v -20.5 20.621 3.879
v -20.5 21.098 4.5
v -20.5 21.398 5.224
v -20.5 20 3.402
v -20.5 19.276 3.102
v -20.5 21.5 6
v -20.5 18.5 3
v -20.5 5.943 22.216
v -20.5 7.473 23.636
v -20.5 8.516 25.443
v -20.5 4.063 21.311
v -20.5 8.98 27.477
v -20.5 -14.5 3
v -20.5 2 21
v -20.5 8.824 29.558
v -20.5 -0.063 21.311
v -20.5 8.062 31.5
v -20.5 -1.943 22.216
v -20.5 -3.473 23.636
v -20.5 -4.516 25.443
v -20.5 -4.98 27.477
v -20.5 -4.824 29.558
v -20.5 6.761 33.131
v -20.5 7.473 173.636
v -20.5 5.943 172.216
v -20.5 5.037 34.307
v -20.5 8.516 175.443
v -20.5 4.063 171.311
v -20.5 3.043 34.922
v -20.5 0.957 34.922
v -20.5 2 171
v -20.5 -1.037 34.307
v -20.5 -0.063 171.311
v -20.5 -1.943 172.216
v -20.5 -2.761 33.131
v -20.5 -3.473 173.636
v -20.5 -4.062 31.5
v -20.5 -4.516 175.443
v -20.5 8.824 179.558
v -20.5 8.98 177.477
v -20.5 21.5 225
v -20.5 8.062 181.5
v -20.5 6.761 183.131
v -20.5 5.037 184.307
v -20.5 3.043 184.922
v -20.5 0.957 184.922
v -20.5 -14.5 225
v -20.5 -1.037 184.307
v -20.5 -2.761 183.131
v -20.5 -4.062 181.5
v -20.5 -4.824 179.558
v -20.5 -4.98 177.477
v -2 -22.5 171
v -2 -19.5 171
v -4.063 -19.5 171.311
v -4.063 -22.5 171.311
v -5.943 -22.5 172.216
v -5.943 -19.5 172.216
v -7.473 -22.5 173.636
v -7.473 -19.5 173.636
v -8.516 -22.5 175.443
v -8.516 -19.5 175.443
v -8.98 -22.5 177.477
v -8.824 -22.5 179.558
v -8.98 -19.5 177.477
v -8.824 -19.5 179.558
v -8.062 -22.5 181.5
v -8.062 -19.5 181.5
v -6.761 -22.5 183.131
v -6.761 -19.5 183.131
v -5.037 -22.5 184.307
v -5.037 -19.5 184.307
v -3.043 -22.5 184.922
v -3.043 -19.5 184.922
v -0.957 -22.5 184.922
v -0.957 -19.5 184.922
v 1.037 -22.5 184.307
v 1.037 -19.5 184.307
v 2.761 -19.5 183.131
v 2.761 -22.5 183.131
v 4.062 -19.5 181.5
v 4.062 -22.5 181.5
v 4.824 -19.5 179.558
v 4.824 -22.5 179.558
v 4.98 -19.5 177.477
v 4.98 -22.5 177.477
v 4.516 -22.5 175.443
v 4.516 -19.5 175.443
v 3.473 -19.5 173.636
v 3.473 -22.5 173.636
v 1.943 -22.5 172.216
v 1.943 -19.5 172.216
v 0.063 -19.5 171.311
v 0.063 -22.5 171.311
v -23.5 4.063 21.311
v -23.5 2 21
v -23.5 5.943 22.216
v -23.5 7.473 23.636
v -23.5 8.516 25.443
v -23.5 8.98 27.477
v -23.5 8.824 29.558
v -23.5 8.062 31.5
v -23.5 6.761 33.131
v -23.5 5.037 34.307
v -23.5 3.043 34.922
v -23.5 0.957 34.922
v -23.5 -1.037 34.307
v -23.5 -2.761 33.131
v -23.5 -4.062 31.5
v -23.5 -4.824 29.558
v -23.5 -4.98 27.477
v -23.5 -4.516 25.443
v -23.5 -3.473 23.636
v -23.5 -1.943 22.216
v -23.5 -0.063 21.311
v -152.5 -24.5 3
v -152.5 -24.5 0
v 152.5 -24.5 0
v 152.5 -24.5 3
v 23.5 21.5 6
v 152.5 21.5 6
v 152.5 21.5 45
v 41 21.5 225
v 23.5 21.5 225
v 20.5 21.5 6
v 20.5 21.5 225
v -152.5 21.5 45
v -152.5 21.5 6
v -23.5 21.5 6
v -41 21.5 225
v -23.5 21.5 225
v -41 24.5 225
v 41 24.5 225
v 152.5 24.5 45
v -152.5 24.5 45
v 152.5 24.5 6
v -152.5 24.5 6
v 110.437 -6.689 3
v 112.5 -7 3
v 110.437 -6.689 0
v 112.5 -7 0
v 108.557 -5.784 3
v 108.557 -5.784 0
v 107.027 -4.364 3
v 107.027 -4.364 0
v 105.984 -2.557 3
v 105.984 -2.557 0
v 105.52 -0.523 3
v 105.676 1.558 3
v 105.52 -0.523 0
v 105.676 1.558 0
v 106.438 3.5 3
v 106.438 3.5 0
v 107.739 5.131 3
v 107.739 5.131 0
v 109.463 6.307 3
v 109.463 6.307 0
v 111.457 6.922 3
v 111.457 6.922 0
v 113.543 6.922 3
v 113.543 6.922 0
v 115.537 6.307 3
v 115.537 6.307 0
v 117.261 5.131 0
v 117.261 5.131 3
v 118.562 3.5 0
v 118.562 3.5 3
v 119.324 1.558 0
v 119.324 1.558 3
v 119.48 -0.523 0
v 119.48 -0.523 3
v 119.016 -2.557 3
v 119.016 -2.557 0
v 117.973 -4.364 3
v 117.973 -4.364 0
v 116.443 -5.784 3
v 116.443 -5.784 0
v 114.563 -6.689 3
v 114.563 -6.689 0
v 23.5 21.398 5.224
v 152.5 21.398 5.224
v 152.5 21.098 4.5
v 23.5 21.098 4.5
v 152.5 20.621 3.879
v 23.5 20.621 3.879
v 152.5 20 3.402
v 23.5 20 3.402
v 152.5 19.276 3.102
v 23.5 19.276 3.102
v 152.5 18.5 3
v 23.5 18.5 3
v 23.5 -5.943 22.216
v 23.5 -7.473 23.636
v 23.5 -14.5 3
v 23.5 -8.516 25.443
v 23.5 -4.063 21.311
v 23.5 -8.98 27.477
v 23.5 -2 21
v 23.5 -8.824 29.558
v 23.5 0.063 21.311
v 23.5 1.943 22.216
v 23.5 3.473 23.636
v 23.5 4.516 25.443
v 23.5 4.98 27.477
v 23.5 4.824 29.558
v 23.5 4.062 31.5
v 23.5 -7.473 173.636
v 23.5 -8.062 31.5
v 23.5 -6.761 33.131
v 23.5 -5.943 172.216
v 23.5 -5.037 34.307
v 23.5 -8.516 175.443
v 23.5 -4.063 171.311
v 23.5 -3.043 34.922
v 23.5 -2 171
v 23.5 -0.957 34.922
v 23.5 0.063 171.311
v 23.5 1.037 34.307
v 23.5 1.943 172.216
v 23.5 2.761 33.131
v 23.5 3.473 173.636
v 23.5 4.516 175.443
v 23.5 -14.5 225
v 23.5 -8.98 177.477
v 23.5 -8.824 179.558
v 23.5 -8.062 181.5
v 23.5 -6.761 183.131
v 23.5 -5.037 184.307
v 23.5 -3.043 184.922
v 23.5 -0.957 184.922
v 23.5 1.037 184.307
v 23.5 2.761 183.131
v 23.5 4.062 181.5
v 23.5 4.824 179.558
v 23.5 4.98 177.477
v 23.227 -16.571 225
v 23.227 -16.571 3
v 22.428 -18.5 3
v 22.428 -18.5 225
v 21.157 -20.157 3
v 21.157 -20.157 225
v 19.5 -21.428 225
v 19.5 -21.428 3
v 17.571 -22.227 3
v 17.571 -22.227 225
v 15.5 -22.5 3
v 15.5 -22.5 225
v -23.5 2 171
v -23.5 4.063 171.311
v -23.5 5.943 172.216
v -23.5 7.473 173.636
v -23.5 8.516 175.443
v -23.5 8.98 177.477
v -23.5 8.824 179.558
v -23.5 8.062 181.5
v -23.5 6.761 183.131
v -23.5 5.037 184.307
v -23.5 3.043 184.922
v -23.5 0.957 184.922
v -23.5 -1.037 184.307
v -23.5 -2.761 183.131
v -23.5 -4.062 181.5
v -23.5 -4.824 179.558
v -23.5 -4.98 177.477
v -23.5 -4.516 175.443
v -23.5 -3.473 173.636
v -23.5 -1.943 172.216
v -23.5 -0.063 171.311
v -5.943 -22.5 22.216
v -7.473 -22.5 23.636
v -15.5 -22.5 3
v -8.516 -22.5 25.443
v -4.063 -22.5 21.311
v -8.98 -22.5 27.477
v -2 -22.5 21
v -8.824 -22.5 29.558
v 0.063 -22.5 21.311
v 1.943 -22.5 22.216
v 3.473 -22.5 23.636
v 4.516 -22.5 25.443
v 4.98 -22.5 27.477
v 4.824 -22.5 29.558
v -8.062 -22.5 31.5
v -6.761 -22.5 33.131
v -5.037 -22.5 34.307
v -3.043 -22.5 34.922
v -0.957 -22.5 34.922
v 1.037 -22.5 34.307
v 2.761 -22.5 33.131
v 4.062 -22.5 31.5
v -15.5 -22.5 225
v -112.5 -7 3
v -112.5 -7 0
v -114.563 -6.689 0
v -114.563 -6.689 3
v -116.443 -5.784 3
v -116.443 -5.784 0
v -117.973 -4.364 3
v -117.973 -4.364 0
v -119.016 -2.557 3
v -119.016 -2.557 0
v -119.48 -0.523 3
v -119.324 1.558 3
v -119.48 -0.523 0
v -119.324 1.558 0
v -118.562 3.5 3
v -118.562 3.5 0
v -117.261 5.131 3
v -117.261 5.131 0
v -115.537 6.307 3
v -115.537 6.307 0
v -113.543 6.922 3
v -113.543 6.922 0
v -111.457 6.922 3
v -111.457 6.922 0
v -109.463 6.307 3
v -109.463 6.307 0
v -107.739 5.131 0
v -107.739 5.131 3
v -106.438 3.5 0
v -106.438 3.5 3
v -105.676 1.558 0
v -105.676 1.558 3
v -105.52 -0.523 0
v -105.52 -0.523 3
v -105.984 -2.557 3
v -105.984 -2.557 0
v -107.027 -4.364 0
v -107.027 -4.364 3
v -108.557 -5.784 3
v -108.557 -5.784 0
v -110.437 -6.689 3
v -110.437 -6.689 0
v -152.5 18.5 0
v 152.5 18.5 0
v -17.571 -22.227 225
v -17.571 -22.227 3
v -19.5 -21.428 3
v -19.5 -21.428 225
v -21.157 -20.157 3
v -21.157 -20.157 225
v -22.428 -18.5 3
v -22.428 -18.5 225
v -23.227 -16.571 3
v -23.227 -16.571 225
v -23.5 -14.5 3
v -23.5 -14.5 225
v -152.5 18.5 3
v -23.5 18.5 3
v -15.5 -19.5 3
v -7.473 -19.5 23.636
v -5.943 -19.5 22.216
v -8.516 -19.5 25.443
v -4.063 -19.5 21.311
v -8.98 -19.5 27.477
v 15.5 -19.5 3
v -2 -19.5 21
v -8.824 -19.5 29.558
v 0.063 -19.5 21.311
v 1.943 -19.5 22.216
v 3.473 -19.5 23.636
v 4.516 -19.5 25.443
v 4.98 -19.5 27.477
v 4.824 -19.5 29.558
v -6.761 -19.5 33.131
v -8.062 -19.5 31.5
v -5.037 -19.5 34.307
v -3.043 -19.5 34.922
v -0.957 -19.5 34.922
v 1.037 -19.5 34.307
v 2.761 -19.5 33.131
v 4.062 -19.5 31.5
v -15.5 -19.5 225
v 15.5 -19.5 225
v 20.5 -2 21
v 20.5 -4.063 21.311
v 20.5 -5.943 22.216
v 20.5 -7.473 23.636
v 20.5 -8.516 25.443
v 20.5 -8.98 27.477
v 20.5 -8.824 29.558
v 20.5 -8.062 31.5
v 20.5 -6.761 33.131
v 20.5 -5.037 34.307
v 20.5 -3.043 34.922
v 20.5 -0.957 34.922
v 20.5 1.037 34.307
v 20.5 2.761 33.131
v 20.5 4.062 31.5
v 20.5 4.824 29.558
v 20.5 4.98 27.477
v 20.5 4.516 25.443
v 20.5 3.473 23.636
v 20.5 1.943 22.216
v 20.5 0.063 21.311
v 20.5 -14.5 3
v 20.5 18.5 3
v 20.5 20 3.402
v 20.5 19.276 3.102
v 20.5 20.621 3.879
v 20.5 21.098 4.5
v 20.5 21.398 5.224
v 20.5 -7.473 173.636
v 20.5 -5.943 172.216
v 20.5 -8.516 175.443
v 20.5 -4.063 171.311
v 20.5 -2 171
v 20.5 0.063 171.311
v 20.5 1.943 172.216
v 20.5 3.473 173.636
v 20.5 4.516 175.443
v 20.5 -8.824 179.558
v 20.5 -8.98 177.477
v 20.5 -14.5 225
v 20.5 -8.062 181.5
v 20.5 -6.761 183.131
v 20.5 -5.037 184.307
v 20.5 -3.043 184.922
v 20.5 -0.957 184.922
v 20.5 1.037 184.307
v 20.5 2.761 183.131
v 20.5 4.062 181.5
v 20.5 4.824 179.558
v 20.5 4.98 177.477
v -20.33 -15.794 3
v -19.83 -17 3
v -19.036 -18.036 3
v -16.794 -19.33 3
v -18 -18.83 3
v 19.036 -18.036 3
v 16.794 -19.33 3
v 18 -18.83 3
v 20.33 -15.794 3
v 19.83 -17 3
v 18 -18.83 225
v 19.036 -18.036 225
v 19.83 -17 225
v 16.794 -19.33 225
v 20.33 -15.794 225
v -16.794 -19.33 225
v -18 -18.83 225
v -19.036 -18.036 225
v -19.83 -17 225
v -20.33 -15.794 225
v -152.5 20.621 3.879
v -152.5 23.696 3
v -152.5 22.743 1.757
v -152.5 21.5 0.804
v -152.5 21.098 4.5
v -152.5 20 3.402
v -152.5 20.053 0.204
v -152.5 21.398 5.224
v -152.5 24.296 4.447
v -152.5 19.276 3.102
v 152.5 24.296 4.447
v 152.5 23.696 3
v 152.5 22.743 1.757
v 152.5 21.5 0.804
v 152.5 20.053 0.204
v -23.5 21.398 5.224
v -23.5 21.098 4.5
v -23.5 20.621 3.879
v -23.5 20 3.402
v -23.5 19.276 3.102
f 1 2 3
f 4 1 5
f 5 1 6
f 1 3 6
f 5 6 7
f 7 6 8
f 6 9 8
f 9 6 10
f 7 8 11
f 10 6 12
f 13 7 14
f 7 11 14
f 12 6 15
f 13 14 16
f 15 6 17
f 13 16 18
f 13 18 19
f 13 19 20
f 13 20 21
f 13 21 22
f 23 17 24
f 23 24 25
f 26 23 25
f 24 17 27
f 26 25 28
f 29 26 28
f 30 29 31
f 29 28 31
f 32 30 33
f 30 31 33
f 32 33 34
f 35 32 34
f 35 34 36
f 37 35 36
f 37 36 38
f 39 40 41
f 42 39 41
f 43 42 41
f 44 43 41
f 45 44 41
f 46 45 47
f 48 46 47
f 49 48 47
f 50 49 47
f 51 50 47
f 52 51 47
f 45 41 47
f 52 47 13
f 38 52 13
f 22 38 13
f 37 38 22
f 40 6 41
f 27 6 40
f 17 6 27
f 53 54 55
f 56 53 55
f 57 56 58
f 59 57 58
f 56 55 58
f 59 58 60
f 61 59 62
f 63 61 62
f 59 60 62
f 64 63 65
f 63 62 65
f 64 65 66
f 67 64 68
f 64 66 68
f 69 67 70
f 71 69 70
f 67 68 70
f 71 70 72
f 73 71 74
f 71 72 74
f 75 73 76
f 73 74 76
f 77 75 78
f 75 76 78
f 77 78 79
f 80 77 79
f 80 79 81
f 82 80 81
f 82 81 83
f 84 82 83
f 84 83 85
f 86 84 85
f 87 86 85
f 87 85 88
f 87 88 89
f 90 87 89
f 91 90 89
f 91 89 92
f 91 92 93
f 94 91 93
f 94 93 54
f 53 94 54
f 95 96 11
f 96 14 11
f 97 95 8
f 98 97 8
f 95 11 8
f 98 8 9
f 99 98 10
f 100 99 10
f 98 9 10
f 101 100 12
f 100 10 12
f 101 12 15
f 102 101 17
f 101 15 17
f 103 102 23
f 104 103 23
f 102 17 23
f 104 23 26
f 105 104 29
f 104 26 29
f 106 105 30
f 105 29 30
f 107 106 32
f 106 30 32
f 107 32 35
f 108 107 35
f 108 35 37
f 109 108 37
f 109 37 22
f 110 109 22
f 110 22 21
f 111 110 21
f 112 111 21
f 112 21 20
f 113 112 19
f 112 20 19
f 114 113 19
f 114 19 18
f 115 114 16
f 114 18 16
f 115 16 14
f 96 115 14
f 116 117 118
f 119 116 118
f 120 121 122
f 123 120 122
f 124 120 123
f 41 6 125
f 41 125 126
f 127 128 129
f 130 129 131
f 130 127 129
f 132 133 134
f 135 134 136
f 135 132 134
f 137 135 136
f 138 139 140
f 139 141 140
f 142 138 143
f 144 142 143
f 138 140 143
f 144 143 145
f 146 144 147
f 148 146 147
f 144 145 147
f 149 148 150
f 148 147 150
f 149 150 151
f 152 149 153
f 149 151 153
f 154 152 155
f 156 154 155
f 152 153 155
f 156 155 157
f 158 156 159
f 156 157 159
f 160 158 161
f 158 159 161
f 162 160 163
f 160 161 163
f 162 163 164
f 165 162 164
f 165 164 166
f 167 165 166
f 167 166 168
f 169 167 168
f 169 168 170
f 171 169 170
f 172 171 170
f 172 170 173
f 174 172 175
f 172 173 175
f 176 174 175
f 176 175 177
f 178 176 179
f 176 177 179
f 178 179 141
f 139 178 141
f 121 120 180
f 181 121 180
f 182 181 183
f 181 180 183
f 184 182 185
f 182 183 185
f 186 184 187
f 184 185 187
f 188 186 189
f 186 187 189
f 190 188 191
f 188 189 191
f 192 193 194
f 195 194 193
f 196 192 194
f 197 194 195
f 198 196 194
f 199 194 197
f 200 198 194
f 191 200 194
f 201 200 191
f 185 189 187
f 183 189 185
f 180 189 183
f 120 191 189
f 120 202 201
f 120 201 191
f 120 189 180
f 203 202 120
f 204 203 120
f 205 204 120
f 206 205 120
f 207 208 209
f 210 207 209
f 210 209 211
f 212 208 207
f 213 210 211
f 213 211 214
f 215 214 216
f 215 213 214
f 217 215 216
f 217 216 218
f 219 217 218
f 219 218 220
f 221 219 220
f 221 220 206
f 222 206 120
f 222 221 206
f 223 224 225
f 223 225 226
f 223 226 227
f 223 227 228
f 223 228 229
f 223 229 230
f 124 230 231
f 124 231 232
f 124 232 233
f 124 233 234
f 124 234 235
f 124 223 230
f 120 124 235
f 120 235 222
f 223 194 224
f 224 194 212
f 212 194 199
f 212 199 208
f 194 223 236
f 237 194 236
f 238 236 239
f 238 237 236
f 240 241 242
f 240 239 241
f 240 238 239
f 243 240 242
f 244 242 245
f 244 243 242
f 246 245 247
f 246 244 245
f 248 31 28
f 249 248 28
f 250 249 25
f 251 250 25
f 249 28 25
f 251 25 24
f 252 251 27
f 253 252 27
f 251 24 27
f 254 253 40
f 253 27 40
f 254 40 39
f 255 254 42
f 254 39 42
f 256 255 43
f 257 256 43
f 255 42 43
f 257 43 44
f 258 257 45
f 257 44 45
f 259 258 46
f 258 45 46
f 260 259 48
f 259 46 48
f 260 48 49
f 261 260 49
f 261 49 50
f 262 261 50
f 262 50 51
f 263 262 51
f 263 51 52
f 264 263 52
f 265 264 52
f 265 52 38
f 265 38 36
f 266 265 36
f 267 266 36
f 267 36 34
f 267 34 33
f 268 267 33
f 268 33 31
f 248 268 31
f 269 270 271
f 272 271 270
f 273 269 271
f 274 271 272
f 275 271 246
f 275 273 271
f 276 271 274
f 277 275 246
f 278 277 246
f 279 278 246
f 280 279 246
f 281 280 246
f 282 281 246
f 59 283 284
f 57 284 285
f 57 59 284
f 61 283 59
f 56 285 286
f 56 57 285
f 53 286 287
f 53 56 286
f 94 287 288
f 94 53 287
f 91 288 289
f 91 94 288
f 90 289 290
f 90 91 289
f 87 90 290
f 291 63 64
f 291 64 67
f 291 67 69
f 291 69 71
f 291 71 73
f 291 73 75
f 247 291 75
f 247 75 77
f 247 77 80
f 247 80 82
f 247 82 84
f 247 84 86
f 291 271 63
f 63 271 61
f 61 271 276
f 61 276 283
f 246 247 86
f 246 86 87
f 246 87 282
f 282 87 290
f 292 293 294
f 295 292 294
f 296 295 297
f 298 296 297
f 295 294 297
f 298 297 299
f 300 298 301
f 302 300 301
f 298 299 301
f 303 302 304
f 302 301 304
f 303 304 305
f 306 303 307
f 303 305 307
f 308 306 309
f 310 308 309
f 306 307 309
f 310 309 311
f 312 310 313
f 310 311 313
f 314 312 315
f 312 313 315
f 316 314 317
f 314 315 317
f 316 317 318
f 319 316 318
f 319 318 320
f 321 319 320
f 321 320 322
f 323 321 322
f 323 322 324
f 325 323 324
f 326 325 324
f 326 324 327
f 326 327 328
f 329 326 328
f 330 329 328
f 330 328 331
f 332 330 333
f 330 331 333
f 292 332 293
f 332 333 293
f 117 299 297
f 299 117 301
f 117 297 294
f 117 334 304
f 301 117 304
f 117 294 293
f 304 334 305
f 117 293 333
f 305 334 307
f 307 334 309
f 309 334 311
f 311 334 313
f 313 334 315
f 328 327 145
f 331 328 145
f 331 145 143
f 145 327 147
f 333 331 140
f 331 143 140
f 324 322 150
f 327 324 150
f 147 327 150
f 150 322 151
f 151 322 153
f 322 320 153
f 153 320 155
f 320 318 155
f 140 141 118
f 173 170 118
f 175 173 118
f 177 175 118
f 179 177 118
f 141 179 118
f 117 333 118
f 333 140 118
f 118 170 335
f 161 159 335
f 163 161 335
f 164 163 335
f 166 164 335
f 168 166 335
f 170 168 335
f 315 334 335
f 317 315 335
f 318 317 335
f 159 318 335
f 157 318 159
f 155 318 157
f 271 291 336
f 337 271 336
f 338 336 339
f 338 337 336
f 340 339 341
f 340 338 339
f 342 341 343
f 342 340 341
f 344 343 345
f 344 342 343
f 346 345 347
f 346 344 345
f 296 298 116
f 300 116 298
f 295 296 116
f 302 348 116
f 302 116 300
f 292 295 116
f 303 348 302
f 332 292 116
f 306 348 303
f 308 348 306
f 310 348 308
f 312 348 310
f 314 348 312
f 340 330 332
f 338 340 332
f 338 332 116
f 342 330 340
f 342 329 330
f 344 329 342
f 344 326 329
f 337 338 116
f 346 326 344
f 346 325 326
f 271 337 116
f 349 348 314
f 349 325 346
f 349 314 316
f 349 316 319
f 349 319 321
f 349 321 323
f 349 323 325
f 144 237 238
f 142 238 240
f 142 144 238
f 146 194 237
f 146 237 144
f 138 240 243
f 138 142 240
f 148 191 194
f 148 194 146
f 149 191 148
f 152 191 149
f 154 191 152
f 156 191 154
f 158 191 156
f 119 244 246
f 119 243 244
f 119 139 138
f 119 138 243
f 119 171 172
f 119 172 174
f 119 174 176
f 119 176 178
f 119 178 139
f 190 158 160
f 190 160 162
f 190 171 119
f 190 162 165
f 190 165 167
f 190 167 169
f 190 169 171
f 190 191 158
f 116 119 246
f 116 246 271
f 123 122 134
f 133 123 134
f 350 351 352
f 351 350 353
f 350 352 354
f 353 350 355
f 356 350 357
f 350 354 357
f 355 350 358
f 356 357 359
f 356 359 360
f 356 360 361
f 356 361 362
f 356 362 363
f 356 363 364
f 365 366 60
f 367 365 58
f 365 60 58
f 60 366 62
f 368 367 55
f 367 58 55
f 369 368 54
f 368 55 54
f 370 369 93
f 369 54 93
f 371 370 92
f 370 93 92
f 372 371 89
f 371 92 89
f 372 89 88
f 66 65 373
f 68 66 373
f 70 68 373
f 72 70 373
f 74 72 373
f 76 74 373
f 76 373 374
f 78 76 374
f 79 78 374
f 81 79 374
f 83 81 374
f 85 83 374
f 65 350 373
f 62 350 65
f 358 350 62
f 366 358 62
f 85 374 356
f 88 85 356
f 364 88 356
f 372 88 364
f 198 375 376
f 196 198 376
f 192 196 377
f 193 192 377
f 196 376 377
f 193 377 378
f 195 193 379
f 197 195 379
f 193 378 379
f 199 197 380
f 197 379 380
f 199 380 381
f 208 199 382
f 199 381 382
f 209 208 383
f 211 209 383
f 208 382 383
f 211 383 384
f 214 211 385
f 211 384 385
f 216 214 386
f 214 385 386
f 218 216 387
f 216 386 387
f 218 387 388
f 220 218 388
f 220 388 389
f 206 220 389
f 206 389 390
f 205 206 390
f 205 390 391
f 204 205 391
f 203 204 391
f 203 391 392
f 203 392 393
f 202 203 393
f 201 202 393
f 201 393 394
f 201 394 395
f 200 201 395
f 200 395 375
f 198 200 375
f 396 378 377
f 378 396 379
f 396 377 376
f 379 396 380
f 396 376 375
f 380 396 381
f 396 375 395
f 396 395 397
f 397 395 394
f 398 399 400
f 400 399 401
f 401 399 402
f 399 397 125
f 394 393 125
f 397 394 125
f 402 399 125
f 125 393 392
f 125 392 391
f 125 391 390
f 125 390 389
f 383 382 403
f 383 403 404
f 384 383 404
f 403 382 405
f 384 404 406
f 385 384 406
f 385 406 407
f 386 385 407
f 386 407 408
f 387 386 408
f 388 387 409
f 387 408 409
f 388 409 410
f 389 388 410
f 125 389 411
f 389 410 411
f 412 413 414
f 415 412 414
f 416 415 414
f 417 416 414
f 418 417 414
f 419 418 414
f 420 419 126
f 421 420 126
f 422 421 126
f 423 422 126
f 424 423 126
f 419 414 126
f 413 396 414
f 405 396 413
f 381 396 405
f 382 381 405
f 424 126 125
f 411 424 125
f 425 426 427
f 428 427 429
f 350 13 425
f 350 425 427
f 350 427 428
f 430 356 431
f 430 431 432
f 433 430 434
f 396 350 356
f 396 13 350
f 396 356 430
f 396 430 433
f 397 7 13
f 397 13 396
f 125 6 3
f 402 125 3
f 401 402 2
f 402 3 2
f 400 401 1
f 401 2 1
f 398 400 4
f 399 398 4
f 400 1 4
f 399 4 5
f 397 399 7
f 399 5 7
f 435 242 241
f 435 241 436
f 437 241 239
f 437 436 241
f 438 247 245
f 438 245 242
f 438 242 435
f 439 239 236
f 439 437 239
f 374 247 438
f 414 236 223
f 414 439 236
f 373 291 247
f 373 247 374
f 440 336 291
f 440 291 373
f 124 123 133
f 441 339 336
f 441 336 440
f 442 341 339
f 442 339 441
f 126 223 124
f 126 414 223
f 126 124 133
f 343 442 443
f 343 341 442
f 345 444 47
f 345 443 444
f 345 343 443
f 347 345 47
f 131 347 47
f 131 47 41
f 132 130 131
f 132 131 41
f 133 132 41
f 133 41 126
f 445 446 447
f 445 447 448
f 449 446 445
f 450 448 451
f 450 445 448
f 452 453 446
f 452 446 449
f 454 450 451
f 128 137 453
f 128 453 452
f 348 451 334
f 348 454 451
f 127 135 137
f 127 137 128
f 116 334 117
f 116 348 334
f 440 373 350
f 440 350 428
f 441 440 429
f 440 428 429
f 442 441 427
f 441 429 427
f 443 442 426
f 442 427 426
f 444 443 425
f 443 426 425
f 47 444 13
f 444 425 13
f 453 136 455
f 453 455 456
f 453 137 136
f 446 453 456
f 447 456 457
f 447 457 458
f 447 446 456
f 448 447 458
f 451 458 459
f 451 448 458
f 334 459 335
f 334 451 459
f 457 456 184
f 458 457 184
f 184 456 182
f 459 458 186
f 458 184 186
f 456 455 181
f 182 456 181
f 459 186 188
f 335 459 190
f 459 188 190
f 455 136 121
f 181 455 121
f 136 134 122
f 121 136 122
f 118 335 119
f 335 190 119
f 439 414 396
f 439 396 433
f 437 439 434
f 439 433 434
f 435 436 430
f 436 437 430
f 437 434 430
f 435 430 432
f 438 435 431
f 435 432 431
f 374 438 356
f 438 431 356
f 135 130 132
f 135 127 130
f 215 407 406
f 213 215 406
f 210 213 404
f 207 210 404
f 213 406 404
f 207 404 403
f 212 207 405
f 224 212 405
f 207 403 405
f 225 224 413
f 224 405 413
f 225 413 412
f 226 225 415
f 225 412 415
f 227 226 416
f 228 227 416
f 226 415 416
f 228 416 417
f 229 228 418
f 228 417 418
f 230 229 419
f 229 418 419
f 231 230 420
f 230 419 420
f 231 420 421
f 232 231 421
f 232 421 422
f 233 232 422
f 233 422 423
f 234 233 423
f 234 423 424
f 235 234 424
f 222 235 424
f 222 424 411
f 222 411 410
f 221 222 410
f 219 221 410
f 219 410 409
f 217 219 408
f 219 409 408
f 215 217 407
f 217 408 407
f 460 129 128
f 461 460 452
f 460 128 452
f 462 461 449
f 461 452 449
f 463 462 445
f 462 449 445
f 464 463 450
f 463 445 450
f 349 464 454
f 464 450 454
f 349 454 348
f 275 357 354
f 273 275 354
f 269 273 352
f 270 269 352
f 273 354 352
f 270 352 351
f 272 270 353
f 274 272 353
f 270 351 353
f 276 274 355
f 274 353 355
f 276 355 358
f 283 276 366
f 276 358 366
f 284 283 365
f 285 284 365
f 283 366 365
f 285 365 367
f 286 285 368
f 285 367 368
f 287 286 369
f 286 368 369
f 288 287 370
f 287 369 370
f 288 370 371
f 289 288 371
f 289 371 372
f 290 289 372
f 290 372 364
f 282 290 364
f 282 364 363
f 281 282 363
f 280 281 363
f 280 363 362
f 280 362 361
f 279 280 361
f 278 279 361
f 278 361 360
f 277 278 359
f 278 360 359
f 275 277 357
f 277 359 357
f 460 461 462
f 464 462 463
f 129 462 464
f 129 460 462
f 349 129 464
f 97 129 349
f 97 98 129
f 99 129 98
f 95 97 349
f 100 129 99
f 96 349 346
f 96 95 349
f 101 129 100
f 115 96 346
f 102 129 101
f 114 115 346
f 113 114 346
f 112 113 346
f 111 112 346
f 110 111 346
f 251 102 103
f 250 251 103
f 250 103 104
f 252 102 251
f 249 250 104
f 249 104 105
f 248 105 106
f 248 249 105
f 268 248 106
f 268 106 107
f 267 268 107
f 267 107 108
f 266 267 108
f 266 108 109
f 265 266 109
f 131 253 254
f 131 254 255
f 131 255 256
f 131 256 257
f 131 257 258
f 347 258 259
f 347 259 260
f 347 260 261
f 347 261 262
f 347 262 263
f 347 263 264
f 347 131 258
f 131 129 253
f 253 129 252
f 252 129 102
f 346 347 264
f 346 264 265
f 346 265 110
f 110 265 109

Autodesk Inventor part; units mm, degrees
ref_plane "YZ Plane" through (0, 0, 0) normal (1, 0, 0) x (0, 1, 0)
ref_plane "XZ Plane" through (0, 0, 0) normal (0, 1, 0) x (-1, 0, 0)
ref_plane "XY Plane" through (0, 0, 0) normal (0, 0, 1) x (1, 0, 0)
sketch "Sketch1" plane through (0, 0, 0) normal (0, 0, 1) x (1, 0, 0)
  line L0 (-152.5, -24.5) -> (152.5, -24.5)
  line L1 (152.5, -24.5) -> (152.5, 24.5)
  line L2 (152.5, 24.5) -> (-152.5, 24.5)
  line L3 (-152.5, 24.5) -> (-152.5, -24.5)
  point P0 (0, 24.5)
  point P1 (0, 0)
  point P2 (-152.5, 0)
  point P3 (0, -24.5)
  dimension "d0" = 305
  dimension "d1" = 49
extrude "Plate1" add sketch "Sketch1" along normal blind 3
sketch "Sketch2" plane through (152.5, 21.5, 0) normal (0, 1, 0) x (-1, 0, 0)
  line L0 (305, 0) -> (0, 0)
  line L1 (0, 0) -> (0, -225)
  line L2 (0, -225) -> (305, -225)
  line L3 (305, -225) -> (305, 0)
edge flange "Flange1" height 225 angle 90 thickness 3 bend radius 3 thickness toward (0, 1, 0) relief tear relief width 3 relief depth 1.5 edges at (0, 24.5, 0) wall of the first edge with corners at (-152.5, 21.5, 0) (152.5, 21.5, 0) (152.5, 21.5, 225) (-152.5, 21.5, 225)
bend "Bend1"
corner "Corner1"
chamfer "Corner Chamfer1" distance 111.5 distance2 180 1 edges at (152.5, 23, 225) measured on face at (-50.8333, 22.5, 225)
chamfer "Corner Chamfer2" distance 111.5 distance2 180 1 edges at (-152.5, 23, 225) measured on face at (-88, 22.5, 225)
sketch "Sketch4" plane through (0, 0, 3) normal (0, 0, 1) x (1, 0, 0)
  line L0 (152.5, -24.5) -> (-152.5, -24.5) projected
  line L1 (-112.5, 0) -> (112.5, 0)
  point P0 (0, 0)
  point P1 (0, 0)
  point P2 (0, -24.5)
  dimension "d26" = 225
  dimension "d27" = 24.5
hole "Hole1" at (-112.5, 0, 3) direction (0, 0, -1) diameter 14 end through all
pattern_linear "Rectangular Pattern1" count 2 spacing 225 along (1, 0, 0) of "Hole1"
sketch "Sketch3" plane through (-41, 21.5, 225) normal (0, 0, 1) x (1, 0, 0)
  line L0 (0, 0) -> (82, 0) projected
  line L1 (20.5, -41) -> (61.5, -41)
  line L2 (61.5, -41) -> (61.5, 0)
  line L3 (61.5, 0) -> (20.5, 0)
  line L4 (20.5, 0) -> (20.5, -41)
  line L5 (17.5, 0) -> (17.5, -44)
  line L6 (17.5, -44) -> (64.5, -44)
  line L7 (64.5, -44) -> (64.5, 0)
  point P0 (41, -21.5)
  point P1 (41, 0)
  dimension "d19" = 41
  dimension "d20" = 41
  dimension "d21" = 3
  dimension "d22" = 3
  dimension "d23" = 3
extrude "Extrusion1" add sketch "Sketch3" against normal up to next contours L0 L4 L1 L2 L7 L6 L5
fillet "Fillet1" radius 5 2 edges at (-20.5, -19.5, 114) (20.5, -19.5, 114)
fillet "Fillet1" radius 8 2 edges at (-23.5, -22.5, 114) (23.5, -22.5, 114)
hole "Hole2" at (23.5, -2, 28) direction (-1, 0, 0) diameter 14 depth 20 tip angle 118
pattern_linear "Rectangular Pattern2" count 2 spacing 150 along (0, 0, 1) of "Hole2"
pattern_circular "Circular Pattern1" count 3 over 180 about axis through (0, 0, -10) along (0, 0, -1) of "Hole2", "Rectangular Pattern2"
equation "\"d33\" = Thickness"
equation "\"d37\" = d26"
equation "\"d20\" = d19"
equation "\"d21\" = Thickness"
equation "\"d22\" = Thickness"
equation "\"d23\" = Thickness"
equation "\"d55\" = Thickness"
equation "\"d3\" = BendReliefWidth"
equation "\"d4\" = BendReliefDepth"
equation "\"d5\" = MinimumRemnant"
equation "\"d6\" = BendRadius"
equation "\"d9\" = BendRadius"
equation "\"d10\" = CornerReliefSize"
equation "\"d11\" = GapSize"
equation "\"d12\" = JacobiRadiusSize"
equation "\"BendRadius\" = Thickness"
equation "\"BendReliefWidth\" = Thickness"
equation "\"BendReliefDepth\" = 0.5 * Thickness"
equation "\"CornerReliefSize\" = 4 * Thickness"
equation "\"MinimumRemnant\" = 2 * Thickness"
equation "\"TransitionRadius\" = BendRadius"
equation "\"JacobiRadiusSize\" = BendRadius"
equation "\"GapSize\" = Thickness"
equation "\"d2\" = BendRadius"
equation "\"Thickness\" = 3"
properties part number "P2348-S1-Unistrut"
